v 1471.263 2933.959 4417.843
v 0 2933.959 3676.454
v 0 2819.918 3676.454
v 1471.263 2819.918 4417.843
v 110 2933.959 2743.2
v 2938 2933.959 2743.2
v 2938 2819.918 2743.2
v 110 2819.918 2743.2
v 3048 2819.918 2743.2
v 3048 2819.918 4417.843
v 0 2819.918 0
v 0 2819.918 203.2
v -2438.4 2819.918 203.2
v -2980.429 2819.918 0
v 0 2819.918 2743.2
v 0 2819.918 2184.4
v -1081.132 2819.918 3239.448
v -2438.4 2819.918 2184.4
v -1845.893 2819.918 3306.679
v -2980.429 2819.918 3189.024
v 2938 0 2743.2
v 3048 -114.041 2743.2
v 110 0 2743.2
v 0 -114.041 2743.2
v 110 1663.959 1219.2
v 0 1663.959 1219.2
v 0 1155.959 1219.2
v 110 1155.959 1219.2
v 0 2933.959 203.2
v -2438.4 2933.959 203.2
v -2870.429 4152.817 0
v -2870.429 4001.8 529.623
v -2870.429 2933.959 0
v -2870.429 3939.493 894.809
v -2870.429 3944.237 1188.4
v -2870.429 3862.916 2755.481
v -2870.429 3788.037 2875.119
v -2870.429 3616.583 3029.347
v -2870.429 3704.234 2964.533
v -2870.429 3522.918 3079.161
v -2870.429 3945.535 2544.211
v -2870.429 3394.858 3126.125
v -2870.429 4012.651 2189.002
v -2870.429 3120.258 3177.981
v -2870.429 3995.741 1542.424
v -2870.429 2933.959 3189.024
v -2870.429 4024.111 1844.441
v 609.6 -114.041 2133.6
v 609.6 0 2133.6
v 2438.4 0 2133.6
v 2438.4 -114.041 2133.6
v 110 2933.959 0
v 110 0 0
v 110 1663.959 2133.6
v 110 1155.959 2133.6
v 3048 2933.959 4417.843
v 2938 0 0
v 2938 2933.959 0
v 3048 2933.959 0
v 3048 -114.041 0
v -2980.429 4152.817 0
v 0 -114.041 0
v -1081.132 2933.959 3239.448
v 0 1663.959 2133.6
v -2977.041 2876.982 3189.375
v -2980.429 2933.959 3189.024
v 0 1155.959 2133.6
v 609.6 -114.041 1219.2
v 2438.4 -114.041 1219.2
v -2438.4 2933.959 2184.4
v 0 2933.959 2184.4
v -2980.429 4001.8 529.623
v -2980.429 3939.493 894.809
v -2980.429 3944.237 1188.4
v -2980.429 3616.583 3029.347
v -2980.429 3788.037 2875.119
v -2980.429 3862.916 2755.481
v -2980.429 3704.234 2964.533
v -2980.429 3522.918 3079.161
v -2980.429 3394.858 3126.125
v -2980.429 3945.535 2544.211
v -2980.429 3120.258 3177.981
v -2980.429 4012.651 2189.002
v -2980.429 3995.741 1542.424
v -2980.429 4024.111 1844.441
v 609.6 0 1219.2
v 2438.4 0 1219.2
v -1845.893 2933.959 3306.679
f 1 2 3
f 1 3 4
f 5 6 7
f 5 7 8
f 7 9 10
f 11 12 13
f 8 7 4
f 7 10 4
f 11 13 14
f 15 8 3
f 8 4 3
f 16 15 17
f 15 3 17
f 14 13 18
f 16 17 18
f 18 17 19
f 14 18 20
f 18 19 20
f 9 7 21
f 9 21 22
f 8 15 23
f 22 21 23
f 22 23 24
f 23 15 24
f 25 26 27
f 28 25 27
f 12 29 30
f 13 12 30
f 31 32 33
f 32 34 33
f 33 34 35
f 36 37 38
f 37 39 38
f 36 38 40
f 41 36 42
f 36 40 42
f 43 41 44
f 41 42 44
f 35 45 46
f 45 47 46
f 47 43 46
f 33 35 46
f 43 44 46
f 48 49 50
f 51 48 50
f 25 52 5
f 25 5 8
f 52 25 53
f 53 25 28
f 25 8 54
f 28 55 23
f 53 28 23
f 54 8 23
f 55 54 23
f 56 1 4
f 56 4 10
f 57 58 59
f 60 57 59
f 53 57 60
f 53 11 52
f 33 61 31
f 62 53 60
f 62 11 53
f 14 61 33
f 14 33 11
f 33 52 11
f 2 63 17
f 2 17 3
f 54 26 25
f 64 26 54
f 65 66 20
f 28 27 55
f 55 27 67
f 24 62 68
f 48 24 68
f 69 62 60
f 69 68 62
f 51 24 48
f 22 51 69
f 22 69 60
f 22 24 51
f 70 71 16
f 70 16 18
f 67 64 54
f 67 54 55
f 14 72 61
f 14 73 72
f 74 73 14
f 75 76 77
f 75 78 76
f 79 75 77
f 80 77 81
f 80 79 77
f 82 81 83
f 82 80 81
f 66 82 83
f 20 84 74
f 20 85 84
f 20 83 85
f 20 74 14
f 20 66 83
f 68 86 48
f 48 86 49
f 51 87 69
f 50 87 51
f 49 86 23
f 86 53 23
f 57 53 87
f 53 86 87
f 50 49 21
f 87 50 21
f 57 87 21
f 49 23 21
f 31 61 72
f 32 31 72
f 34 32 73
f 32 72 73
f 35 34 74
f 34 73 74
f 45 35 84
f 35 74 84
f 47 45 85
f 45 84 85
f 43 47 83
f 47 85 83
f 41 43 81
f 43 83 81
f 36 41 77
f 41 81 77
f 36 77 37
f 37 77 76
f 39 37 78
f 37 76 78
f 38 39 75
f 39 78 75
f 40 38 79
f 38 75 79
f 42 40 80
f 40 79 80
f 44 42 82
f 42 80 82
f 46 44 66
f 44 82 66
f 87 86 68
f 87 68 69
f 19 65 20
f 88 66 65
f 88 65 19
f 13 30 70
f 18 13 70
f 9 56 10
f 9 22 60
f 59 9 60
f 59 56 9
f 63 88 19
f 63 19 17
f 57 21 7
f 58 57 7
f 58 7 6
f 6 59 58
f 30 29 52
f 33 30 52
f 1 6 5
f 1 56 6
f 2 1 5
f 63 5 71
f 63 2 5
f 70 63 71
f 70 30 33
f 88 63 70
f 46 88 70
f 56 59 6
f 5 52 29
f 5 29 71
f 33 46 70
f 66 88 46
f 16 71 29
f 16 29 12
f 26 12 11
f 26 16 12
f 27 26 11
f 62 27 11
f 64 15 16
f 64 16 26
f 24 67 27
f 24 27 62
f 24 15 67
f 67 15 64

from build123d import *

# Parameters (mm, degrees)
F0_W      = 3048
F0_H      = 2743.2
F0_W_2    = 1828.8
F0_H_2    = 914.4
F1_DEPTH  = 114.0408163265
F2_W      = 3048
F2_H      = 2743.2
F2_W_2    = 508
F2_H_2    = 914.4
F3_DEPTH  = 110
F4_W      = 3048
F4_H      = 2743.2
F5_DEPTH  = 110
F7_DEPTH  = 114.0408163265
F8_W      = 2438.4
F8_H      = 1981.2
F9_DEPTH  = 127
F12_DEPTH = 110


with BuildPart() as f1:
    # F0 (on Front) → F1 (new body)
    with BuildSketch(Plane.XZ):
        with Locations((1524, 1371.6)):
            Rectangle(F0_W, F0_H)
        with Locations((1524, 1676.4)):
            Rectangle(F0_W_2, F0_H_2, mode=Mode.SUBTRACT)
    extrude(amount=F1_DEPTH)

    # F2 (on face) → F3 (join)
    with BuildSketch(Plane(origin=(0, 0, 0), x_dir=(0, -1, 0), z_dir=(-1, 0, 0))):
        with Locations((-1409.9591836735, 1371.6)):
            Rectangle(F2_W, F2_H)
        with Locations((-1409.9591836735, 1676.4)):
            Rectangle(F2_W_2, F2_H_2, mode=Mode.SUBTRACT)
    extrude(amount=-F3_DEPTH)

    # F4 (on face) → F5 (join)
    with BuildSketch(Plane.YZ.offset(3048)):
        with Locations((1409.9591836735, 1371.6)):
            Rectangle(F4_W, F4_H)
    extrude(amount=-F5_DEPTH)

    # F6 (on face) → F7 (join)
    with BuildSketch(Plane(origin=(0, 2933.9591836735, 0), x_dir=(-1, 0, 0), z_dir=(0, 1, 0))):
        Polygon((-3048, 4417.843005844), (-3048, 2743.2), (-67.5708274841, 2743.2), (-67.5708274841, 0), (2980.4291725159, 0), (2980.4291725159, 3189.0239715576), (1845.8933830261, 3306.6794872284), (1081.1322927475, 3239.4478321075), (0, 3676.4543056488), (-1184.2903689057, 4273.2337903926), (-1471.2628696237, 4417.843005844), align=None)
    extrude(amount=-F7_DEPTH)


with BuildPart() as f9:
    # F8 (on face) → F9 (new body)
    with BuildSketch(Plane(origin=(0, 2933.9591836735, 0), x_dir=(-1, 0, 0), z_dir=(0, 1, 0))):
        with Locations((1219.2, 1193.8)):
            Rectangle(F8_W, F8_H)
    extrude(amount=-F9_DEPTH)


with BuildPart() as f1_1:
    add(f1.part)

    # F10: cut F9
    add(f9.part, mode=Mode.SUBTRACT)

    # F11 (on face) → F12 (join)
    with BuildSketch(Plane(origin=(-2980.4291725159, 0, 0), x_dir=(0, -1, 0), z_dir=(-1, 0, 0))):
        with BuildLine():
            Line((-4152.8167724609, 0), (-2819.9183673469, 0))
            Line((-2819.9183673469, 0), (-2819.9183673469, 3189.0239715576))
            add(Edge.make_bspline(
                [(-4152.8167724609, 0), (-4046.6455273188, 345.1375544833), (-3845.3586822183, 999.4733812377), (-4093.6663057218, 1753.2278007654), (-3935.8345487708, 3014.8417967905), (-3203.3253565399, 3180.4258230661), (-2944.2198722565, 3190.0984045413), (-2855.5614309803, 3189.3320618196), (-2819.9183673469, 3189.0239715576)],
                knots=[0, 0, 0, 0, 0.2180609313, 0.4134151091, 0.644318702, 0.8178951913, 0.9267889984, 1, 1, 1, 1], degree=3))
        make_face()
    extrude(amount=-F12_DEPTH)


solid = f1_1.part
